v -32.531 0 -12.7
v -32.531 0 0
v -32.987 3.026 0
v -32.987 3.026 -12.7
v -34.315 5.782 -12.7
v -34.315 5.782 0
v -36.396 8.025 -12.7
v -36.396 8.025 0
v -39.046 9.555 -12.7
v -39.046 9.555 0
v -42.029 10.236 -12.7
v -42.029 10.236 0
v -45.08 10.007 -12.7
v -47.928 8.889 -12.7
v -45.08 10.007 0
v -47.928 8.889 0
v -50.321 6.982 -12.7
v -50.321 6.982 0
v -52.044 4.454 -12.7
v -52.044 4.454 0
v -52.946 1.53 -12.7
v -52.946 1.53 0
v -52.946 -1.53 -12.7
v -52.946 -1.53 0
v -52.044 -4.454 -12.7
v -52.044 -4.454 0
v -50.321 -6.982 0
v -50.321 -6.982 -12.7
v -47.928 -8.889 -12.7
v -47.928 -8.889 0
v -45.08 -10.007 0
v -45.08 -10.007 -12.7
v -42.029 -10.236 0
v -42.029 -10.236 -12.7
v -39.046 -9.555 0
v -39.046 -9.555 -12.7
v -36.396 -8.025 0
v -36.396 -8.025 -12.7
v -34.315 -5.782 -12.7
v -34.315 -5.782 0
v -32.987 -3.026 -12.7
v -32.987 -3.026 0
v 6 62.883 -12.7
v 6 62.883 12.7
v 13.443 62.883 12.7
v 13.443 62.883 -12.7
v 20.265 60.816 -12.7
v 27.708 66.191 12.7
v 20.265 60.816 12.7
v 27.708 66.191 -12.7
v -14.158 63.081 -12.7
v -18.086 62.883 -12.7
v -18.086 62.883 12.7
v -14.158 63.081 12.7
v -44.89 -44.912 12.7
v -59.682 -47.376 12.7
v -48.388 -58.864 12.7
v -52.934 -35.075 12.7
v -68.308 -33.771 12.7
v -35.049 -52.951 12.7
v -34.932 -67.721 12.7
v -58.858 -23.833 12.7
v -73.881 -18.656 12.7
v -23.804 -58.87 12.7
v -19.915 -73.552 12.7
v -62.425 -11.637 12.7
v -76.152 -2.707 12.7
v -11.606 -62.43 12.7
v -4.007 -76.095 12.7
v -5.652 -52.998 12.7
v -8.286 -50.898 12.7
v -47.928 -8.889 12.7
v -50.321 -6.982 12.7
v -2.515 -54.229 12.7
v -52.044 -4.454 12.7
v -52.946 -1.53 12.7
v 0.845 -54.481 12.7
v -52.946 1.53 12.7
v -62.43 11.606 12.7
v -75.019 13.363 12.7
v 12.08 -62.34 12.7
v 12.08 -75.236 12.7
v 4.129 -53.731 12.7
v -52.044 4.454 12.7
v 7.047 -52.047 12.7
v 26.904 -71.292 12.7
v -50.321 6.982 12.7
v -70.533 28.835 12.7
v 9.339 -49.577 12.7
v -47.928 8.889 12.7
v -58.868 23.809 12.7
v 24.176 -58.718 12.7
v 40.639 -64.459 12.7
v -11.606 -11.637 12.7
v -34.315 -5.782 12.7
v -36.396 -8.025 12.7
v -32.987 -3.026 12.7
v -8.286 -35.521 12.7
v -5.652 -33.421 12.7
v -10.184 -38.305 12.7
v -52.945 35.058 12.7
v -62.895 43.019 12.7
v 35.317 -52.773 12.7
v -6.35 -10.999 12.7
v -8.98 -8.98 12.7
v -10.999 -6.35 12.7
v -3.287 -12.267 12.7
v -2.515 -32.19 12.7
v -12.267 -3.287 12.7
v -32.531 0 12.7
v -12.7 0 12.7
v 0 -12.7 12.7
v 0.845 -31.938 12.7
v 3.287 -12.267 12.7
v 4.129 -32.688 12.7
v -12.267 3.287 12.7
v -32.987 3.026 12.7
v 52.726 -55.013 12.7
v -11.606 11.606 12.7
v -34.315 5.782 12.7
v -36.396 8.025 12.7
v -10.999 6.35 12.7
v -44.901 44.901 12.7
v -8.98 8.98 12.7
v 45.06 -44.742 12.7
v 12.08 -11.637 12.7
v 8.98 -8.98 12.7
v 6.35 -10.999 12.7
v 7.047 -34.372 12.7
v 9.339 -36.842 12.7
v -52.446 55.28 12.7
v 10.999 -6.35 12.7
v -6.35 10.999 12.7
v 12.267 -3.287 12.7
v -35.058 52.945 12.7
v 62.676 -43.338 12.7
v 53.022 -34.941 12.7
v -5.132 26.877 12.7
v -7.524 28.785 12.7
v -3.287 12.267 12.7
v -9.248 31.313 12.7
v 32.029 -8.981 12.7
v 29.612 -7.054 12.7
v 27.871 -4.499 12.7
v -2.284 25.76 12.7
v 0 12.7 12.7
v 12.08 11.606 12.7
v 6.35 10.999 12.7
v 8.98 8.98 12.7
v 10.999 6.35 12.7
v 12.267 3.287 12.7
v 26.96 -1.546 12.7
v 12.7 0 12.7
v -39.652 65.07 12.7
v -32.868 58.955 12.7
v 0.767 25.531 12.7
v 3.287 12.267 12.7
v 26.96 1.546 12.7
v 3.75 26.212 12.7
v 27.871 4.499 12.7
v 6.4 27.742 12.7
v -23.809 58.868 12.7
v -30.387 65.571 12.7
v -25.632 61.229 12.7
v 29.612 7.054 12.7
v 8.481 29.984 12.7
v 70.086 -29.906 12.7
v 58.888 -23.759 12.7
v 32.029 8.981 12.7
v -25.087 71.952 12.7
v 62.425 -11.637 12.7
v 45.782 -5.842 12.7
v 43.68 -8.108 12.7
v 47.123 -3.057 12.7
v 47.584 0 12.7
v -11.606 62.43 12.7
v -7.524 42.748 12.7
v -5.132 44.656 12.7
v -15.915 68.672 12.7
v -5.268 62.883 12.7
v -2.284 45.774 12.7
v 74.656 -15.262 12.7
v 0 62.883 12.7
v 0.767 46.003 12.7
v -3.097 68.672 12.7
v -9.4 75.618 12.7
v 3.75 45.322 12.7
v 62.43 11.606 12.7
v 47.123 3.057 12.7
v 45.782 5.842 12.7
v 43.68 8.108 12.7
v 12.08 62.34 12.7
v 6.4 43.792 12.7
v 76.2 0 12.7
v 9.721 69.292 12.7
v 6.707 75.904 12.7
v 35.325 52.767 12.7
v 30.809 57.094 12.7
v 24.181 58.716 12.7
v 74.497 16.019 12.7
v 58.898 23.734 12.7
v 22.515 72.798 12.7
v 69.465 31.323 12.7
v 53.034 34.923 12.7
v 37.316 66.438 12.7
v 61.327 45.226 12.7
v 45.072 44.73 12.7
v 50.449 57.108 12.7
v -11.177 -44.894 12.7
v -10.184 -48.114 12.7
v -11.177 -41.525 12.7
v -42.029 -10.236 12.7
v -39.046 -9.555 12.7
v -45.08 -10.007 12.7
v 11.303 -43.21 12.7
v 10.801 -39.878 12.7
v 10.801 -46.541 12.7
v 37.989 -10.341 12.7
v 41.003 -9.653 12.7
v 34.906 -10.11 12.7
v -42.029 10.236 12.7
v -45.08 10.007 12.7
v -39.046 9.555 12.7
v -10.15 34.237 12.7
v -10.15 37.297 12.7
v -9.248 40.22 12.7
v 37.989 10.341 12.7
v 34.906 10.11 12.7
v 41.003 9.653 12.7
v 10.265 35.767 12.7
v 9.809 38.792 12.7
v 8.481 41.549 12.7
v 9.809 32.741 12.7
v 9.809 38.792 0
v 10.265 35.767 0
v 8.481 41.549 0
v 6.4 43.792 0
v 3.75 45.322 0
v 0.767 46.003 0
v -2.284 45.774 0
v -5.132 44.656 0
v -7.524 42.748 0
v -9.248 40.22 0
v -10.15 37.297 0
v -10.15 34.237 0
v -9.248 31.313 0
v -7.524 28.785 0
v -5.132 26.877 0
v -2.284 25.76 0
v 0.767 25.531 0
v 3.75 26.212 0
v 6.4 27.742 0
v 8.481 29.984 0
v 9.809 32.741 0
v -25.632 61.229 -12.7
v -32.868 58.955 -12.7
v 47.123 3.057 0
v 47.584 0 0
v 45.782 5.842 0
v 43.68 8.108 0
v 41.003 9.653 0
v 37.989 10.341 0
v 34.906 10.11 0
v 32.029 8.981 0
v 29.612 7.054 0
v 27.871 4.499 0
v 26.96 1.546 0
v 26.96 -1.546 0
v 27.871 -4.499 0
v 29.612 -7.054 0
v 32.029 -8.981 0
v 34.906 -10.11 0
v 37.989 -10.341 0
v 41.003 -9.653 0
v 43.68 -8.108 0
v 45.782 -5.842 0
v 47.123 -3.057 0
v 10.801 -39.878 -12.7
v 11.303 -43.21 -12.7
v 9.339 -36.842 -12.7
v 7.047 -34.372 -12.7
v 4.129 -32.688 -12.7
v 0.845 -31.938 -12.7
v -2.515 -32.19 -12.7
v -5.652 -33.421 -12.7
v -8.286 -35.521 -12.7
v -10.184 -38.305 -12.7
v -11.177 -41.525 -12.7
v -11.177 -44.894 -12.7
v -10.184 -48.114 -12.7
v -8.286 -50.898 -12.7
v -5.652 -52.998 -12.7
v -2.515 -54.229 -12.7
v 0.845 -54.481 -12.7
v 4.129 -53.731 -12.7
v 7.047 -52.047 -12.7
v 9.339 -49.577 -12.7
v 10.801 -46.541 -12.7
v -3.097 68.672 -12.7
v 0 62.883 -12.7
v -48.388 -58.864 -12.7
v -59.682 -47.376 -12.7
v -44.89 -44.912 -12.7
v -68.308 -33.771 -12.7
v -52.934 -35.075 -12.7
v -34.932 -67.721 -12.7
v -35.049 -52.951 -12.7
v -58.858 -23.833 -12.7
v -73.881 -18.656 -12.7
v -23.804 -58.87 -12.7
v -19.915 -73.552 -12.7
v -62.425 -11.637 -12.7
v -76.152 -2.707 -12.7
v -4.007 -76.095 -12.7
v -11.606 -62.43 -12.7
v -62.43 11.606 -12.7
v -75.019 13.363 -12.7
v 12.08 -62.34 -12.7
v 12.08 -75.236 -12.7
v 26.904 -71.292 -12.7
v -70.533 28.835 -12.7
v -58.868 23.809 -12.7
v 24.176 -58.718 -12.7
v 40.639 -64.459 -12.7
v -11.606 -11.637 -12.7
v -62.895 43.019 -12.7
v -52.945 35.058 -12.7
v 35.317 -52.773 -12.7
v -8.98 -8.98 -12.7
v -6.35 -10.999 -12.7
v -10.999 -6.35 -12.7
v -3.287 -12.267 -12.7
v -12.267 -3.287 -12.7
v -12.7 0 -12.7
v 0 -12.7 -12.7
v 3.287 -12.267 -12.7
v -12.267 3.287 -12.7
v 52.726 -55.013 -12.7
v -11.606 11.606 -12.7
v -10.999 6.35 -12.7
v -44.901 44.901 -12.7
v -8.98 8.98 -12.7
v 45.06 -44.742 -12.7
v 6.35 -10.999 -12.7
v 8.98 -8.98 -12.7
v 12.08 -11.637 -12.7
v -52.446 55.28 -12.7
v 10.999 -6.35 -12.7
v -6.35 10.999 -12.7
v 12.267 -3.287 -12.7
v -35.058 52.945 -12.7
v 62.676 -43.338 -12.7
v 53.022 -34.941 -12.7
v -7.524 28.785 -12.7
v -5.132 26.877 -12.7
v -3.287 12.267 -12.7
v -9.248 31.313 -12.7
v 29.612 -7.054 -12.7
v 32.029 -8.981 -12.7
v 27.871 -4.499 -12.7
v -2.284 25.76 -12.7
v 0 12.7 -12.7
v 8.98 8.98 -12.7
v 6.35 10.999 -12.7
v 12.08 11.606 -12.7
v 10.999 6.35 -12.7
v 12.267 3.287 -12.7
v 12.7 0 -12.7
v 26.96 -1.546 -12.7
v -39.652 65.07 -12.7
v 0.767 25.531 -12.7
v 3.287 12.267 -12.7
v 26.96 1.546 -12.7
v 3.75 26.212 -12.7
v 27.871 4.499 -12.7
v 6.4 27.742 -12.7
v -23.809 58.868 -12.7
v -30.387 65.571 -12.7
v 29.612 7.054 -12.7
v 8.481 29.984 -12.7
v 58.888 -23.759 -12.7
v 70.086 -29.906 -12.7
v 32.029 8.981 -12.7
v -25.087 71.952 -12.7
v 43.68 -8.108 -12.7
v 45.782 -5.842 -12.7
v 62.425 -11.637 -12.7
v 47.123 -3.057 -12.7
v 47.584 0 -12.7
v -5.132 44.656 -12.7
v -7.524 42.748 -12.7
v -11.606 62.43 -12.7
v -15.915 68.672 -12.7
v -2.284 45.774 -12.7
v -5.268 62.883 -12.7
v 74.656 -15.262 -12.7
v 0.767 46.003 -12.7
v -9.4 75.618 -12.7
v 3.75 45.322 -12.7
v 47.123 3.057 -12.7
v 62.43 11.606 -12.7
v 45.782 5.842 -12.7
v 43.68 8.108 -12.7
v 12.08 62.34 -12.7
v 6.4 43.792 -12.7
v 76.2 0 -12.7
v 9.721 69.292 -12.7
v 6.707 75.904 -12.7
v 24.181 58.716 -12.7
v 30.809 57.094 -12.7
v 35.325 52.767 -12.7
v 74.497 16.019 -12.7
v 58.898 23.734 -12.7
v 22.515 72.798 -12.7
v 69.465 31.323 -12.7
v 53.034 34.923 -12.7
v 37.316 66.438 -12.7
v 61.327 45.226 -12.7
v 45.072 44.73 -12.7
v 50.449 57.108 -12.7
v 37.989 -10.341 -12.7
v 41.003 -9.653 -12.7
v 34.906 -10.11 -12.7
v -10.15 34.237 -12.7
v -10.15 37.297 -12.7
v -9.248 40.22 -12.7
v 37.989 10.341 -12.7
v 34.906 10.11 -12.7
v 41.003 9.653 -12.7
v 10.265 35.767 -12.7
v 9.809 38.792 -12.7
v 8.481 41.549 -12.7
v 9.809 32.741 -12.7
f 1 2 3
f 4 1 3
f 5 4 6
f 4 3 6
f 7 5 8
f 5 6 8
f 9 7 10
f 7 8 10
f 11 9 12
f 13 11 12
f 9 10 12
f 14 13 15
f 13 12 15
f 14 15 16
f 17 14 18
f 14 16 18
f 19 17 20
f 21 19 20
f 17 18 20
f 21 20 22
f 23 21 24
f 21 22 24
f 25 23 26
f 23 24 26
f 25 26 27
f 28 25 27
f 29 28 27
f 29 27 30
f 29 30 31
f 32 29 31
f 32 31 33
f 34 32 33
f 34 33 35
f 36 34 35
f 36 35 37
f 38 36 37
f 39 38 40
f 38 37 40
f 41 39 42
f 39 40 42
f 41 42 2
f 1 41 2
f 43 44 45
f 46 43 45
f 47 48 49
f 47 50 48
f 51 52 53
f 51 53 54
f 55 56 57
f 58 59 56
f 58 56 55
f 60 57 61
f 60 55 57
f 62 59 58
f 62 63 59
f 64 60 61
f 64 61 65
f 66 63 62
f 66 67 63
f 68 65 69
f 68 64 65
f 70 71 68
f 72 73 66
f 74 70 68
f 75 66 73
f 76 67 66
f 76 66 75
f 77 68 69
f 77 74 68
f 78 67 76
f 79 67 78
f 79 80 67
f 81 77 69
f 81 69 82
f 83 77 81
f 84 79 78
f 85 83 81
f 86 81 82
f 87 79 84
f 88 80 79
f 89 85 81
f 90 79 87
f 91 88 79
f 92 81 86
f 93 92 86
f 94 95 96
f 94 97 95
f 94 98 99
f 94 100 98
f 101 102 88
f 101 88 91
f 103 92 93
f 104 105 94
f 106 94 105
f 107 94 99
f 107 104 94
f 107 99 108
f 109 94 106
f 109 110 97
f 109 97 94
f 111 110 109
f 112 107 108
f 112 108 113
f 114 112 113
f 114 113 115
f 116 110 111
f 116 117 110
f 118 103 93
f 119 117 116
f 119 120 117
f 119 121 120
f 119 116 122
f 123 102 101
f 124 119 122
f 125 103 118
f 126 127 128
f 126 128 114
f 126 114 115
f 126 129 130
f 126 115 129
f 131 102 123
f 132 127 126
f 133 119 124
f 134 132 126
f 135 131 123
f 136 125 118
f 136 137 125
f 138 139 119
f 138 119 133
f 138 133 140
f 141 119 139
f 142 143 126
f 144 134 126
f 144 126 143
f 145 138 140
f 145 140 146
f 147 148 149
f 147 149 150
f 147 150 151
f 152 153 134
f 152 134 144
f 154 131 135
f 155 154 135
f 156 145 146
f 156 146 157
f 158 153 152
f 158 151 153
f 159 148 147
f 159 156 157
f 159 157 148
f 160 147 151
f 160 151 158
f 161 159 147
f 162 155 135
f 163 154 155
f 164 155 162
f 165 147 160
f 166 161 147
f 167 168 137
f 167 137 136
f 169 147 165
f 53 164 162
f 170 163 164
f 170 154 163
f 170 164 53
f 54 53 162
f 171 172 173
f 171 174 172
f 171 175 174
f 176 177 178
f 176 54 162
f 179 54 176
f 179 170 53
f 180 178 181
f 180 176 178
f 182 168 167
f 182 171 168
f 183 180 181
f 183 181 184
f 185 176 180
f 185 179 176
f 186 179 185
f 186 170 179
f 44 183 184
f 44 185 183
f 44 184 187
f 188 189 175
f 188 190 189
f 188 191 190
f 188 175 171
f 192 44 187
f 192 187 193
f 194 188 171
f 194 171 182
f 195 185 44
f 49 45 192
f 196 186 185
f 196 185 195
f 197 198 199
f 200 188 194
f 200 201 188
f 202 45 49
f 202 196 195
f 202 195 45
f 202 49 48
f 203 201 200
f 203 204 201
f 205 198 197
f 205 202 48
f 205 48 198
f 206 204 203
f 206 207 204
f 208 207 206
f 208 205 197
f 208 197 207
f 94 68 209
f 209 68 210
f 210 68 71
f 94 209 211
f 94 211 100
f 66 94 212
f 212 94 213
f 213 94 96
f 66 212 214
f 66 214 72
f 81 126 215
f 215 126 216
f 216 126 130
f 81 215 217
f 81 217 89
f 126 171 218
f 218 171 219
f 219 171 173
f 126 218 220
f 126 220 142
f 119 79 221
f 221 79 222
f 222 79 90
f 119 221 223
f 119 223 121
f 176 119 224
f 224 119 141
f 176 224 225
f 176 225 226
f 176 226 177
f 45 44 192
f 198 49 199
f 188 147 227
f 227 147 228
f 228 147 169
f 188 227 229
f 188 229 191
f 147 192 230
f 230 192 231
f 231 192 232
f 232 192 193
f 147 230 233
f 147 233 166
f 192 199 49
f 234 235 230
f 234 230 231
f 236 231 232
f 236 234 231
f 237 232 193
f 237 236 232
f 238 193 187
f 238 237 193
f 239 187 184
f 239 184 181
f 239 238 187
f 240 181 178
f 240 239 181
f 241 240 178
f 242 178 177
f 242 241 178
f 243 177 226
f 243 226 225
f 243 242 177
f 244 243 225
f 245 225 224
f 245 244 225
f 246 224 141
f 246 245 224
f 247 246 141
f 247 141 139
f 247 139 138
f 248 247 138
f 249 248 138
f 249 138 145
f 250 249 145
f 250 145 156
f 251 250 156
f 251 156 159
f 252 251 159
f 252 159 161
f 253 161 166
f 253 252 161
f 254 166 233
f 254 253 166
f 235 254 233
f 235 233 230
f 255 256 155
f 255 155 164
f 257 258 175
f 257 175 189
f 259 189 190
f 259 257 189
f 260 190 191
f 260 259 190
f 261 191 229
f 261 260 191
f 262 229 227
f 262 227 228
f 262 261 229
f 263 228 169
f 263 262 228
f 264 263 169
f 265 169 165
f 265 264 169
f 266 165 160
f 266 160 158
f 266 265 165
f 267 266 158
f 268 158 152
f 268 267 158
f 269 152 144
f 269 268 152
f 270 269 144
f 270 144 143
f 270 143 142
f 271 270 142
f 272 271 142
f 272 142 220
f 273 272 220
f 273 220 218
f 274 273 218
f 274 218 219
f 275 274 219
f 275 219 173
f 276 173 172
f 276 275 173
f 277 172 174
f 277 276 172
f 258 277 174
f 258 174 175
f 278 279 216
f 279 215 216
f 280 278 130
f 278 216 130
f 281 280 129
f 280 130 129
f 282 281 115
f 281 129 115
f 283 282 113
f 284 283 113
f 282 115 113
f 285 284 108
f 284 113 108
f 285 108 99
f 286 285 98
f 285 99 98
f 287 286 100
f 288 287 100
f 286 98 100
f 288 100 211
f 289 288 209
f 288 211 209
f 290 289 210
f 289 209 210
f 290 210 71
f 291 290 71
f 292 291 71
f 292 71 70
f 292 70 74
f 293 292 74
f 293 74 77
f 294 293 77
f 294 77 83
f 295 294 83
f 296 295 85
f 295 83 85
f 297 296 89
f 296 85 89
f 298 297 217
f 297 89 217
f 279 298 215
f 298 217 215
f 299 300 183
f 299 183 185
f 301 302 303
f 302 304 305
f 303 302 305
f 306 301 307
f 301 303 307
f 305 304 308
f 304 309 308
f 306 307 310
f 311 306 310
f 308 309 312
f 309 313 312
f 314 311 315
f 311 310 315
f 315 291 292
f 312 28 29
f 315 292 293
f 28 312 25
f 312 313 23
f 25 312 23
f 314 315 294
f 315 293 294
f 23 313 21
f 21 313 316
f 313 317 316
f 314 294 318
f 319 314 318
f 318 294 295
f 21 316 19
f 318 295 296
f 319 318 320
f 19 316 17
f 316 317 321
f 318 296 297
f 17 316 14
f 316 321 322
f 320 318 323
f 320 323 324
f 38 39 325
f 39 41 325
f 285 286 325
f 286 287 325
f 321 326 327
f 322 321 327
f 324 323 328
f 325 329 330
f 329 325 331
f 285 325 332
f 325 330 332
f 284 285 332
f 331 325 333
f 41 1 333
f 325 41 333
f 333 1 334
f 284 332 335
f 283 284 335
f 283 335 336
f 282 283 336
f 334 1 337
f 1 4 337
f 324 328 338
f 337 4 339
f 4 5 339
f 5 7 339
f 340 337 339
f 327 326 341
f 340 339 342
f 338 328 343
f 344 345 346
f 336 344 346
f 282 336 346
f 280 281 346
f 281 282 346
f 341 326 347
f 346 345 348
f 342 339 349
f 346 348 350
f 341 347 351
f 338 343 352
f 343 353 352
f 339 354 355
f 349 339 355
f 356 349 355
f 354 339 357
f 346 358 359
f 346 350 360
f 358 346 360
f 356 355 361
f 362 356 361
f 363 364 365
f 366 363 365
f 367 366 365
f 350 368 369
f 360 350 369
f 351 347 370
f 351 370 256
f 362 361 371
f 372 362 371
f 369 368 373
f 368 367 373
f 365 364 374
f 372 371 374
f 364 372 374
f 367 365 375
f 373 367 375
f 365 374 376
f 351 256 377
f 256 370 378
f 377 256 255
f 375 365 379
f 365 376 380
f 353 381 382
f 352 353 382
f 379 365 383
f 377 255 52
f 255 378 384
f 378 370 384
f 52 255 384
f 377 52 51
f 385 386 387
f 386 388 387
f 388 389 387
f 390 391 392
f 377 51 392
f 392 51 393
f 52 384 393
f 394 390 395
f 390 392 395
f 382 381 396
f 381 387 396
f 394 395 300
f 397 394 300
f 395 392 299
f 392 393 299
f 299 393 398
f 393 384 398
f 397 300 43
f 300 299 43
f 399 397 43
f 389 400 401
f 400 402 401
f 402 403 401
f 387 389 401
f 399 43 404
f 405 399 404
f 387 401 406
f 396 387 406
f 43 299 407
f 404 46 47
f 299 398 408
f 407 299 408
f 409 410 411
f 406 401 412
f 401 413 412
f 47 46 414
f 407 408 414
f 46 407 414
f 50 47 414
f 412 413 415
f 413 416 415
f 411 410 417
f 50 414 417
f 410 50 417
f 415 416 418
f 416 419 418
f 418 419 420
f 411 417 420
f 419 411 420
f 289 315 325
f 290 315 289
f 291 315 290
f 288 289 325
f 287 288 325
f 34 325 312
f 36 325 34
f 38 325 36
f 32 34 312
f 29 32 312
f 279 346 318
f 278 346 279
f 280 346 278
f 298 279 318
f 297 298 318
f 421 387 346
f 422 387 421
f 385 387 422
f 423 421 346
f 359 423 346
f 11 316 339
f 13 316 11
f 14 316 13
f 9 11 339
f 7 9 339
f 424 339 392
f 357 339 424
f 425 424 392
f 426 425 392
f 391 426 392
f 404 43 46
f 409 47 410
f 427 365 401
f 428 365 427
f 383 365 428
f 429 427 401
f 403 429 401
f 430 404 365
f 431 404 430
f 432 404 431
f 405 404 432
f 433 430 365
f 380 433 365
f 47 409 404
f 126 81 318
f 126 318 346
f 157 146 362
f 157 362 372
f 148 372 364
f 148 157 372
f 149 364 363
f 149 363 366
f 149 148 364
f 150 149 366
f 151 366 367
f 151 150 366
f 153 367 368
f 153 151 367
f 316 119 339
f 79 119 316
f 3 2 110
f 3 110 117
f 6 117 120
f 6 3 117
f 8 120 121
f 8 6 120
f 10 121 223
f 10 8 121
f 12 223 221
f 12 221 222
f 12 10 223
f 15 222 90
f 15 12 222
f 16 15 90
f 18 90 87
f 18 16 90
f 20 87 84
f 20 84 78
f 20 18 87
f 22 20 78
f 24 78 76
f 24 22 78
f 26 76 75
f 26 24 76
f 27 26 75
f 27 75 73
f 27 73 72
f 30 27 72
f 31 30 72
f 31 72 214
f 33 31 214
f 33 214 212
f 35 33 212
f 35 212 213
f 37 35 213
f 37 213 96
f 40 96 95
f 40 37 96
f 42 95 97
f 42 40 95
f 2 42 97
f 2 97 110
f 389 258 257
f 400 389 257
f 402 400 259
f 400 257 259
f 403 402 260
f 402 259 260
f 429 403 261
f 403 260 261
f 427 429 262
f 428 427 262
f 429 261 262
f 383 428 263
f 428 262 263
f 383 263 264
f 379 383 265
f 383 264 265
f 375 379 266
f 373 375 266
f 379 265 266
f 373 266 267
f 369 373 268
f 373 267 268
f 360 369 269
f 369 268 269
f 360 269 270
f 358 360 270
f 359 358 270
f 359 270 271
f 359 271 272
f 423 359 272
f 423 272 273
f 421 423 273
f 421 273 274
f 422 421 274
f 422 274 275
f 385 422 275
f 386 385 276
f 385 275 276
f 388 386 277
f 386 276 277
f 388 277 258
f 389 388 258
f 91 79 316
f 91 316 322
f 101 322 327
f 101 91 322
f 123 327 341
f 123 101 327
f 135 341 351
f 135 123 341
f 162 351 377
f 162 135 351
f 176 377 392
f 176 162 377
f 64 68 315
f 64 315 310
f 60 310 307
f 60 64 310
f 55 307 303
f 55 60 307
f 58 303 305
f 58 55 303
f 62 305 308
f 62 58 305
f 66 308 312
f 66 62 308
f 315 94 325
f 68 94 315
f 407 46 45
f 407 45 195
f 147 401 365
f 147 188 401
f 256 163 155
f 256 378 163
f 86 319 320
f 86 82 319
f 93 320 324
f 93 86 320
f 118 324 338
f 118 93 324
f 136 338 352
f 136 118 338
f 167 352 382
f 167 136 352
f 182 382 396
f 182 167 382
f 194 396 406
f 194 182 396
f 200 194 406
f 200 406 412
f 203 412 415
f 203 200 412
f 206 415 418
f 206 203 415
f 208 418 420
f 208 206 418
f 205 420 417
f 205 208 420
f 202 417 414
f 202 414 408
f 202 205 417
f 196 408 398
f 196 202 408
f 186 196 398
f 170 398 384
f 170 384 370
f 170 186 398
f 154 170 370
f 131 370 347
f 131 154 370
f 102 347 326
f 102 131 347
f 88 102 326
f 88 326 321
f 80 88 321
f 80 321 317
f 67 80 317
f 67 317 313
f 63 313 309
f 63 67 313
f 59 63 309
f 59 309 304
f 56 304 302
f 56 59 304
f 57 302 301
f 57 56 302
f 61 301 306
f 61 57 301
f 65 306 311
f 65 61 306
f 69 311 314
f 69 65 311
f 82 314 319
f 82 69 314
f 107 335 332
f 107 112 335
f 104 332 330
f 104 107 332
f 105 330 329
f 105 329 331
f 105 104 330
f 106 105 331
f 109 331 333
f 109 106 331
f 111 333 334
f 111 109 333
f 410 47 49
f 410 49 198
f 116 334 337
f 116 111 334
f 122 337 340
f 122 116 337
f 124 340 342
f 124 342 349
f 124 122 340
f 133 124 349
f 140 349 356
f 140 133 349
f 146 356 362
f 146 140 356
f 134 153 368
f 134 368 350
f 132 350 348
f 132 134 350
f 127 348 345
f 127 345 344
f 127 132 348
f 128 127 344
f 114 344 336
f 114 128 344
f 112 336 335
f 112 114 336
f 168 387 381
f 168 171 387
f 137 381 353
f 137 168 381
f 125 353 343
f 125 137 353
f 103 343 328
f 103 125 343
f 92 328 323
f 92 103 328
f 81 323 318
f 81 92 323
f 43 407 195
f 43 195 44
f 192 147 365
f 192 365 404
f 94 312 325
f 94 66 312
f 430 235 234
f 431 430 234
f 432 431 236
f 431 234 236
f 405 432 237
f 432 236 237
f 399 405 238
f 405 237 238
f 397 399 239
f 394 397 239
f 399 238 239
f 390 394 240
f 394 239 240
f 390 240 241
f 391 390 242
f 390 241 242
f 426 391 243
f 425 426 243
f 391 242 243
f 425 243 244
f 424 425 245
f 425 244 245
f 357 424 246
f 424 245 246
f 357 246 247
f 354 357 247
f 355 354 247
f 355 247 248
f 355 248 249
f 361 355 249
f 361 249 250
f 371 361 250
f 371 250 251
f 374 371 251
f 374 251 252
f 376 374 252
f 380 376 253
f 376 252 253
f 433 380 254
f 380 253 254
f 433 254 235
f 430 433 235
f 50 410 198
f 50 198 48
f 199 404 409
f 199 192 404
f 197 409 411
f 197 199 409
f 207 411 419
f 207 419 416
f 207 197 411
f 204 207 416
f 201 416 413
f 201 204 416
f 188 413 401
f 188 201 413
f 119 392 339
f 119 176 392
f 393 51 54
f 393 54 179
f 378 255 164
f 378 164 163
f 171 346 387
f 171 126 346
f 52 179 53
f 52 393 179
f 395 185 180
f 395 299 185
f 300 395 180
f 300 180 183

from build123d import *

# Parameters (mm, degrees)
F1_DEPTH = 12.7
F2_R     = 3.365552
F2_R_2   = 3.520723
F2_R_3   = 3.514653
F2_R_4   = 3.746049
F2_R_5   = 3.497554
F2_R_6   = 3.892974
F2_R_7   = 3.939651
F2_R_8   = 10.370237
F2_R_9   = 10.264594
F2_R_10  = 10.264592
F2_R_11  = 11.303067
F3_DEPTH = 12.7


with BuildPart() as f1:
    # F0 (on Top) → F1 (new body, symmetric)
    with BuildSketch(Plane.XY):
        with BuildLine():
            ThreePointArc((12.079931, -75.236396), (57.995391, -49.426457), (76.2, 0))
            ThreePointArc((76.2, 0), (-57.995391, 49.426457), (12.079931, -75.236396))
        make_face()
        with BuildLine():
            ThreePointArc((-11.6058, -62.430405), (-44.890071, -44.912488), (-62.424602, -11.636967))
            Line((-62.424602, -11.636967), (-11.6058, -11.636967))
            Line((-11.6058, -11.636967), (-11.6058, -62.430405))
        make_face(mode=Mode.SUBTRACT)
        with BuildLine():
            Line((12.079931, -62.340398), (12.079931, -11.636967))
            Line((12.079931, -11.636967), (62.424602, -11.636967))
            ThreePointArc((62.424602, -11.636967), (45.060413, -44.741582), (12.079931, -62.340398))
        make_face(mode=Mode.SUBTRACT)
        with BuildLine():
            ThreePointArc((-62.430405, 11.605796), (-44.901282, 44.901279), (-11.6058, 62.430405))
            Line((-11.6058, 62.430405), (-11.6058, 11.605796))
            Line((-11.6058, 11.605796), (-62.430405, 11.605796))
        make_face(mode=Mode.SUBTRACT)
        with BuildLine():
            ThreePointArc((0, 12.7), (8.980256, 8.980256), (12.7, 0))
            ThreePointArc((12.7, 0), (8.980256, -8.980256), (0, -12.7))
            ThreePointArc((0, -12.7), (-8.980256, -8.980256), (-12.7, 0))
            ThreePointArc((-12.7, 0), (-8.980256, 8.980256), (0, 12.7))
        make_face(mode=Mode.SUBTRACT)
        with BuildLine():
            Line((12.079931, 11.605796), (12.079931, 62.340398))
            ThreePointArc((12.079931, 62.340398), (45.071582, 44.73033), (62.430405, 11.605796))
            Line((62.430405, 11.605796), (12.079931, 11.605796))
        make_face(mode=Mode.SUBTRACT)
    extrude(amount=F1_DEPTH, both=True)

    # F2 (on Top) → F3 (cut, symmetric)
    with BuildSketch(Plane.XY):
        with Locations((-39.48367, 31.044669)):
            Circle(F2_R)
        with Locations((-28.732972, 30.837925)):
            Circle(F2_R)
        Polygon((-25.63181, 61.229318), (-30.386927, 65.570951), (-32.867856, 58.955137), align=None)
        Polygon((-14.157661, 63.081107), (-15.914831, 68.672113), (-18.085646, 62.883273), align=None)
        Polygon((0, 62.883273), (-3.096693, 68.672113), (-5.267507, 62.883273), align=None)
        Polygon((9.721447, 69.292344), (6.000051, 62.883273), (13.442842, 62.883273), align=None)
        Polygon((30.809354, 57.094436), (27.708191, 66.191182), (20.265399, 60.815834), align=None)
        with Locations((25.222793, 32.252096)):
            Circle(F2_R_2)
        with Locations((38.661163, 32.045349)):
            Circle(F2_R_3)
        with Locations((-37.420698, -32.44324)):
            Circle(F2_R_4)
        with Locations((-26.049767, -32.44324)):
            Circle(F2_R_5)
        with Locations((20.674419, -34.583465)):
            Circle(F2_R_6)
        with Locations((34.112792, -34.583465)):
            Circle(F2_R_7)
        with Locations((37.213955, 0)):
            Circle(F2_R_8)
        with Locations((-42.796046, 0)):
            Circle(F2_R_9)
        with Locations((0, 35.766747)):
            Circle(F2_R_10)
        with Locations((0, -43.209538)):
            Circle(F2_R_11)
    extrude(amount=F3_DEPTH, both=True, mode=Mode.SUBTRACT)


solid = f1.part
